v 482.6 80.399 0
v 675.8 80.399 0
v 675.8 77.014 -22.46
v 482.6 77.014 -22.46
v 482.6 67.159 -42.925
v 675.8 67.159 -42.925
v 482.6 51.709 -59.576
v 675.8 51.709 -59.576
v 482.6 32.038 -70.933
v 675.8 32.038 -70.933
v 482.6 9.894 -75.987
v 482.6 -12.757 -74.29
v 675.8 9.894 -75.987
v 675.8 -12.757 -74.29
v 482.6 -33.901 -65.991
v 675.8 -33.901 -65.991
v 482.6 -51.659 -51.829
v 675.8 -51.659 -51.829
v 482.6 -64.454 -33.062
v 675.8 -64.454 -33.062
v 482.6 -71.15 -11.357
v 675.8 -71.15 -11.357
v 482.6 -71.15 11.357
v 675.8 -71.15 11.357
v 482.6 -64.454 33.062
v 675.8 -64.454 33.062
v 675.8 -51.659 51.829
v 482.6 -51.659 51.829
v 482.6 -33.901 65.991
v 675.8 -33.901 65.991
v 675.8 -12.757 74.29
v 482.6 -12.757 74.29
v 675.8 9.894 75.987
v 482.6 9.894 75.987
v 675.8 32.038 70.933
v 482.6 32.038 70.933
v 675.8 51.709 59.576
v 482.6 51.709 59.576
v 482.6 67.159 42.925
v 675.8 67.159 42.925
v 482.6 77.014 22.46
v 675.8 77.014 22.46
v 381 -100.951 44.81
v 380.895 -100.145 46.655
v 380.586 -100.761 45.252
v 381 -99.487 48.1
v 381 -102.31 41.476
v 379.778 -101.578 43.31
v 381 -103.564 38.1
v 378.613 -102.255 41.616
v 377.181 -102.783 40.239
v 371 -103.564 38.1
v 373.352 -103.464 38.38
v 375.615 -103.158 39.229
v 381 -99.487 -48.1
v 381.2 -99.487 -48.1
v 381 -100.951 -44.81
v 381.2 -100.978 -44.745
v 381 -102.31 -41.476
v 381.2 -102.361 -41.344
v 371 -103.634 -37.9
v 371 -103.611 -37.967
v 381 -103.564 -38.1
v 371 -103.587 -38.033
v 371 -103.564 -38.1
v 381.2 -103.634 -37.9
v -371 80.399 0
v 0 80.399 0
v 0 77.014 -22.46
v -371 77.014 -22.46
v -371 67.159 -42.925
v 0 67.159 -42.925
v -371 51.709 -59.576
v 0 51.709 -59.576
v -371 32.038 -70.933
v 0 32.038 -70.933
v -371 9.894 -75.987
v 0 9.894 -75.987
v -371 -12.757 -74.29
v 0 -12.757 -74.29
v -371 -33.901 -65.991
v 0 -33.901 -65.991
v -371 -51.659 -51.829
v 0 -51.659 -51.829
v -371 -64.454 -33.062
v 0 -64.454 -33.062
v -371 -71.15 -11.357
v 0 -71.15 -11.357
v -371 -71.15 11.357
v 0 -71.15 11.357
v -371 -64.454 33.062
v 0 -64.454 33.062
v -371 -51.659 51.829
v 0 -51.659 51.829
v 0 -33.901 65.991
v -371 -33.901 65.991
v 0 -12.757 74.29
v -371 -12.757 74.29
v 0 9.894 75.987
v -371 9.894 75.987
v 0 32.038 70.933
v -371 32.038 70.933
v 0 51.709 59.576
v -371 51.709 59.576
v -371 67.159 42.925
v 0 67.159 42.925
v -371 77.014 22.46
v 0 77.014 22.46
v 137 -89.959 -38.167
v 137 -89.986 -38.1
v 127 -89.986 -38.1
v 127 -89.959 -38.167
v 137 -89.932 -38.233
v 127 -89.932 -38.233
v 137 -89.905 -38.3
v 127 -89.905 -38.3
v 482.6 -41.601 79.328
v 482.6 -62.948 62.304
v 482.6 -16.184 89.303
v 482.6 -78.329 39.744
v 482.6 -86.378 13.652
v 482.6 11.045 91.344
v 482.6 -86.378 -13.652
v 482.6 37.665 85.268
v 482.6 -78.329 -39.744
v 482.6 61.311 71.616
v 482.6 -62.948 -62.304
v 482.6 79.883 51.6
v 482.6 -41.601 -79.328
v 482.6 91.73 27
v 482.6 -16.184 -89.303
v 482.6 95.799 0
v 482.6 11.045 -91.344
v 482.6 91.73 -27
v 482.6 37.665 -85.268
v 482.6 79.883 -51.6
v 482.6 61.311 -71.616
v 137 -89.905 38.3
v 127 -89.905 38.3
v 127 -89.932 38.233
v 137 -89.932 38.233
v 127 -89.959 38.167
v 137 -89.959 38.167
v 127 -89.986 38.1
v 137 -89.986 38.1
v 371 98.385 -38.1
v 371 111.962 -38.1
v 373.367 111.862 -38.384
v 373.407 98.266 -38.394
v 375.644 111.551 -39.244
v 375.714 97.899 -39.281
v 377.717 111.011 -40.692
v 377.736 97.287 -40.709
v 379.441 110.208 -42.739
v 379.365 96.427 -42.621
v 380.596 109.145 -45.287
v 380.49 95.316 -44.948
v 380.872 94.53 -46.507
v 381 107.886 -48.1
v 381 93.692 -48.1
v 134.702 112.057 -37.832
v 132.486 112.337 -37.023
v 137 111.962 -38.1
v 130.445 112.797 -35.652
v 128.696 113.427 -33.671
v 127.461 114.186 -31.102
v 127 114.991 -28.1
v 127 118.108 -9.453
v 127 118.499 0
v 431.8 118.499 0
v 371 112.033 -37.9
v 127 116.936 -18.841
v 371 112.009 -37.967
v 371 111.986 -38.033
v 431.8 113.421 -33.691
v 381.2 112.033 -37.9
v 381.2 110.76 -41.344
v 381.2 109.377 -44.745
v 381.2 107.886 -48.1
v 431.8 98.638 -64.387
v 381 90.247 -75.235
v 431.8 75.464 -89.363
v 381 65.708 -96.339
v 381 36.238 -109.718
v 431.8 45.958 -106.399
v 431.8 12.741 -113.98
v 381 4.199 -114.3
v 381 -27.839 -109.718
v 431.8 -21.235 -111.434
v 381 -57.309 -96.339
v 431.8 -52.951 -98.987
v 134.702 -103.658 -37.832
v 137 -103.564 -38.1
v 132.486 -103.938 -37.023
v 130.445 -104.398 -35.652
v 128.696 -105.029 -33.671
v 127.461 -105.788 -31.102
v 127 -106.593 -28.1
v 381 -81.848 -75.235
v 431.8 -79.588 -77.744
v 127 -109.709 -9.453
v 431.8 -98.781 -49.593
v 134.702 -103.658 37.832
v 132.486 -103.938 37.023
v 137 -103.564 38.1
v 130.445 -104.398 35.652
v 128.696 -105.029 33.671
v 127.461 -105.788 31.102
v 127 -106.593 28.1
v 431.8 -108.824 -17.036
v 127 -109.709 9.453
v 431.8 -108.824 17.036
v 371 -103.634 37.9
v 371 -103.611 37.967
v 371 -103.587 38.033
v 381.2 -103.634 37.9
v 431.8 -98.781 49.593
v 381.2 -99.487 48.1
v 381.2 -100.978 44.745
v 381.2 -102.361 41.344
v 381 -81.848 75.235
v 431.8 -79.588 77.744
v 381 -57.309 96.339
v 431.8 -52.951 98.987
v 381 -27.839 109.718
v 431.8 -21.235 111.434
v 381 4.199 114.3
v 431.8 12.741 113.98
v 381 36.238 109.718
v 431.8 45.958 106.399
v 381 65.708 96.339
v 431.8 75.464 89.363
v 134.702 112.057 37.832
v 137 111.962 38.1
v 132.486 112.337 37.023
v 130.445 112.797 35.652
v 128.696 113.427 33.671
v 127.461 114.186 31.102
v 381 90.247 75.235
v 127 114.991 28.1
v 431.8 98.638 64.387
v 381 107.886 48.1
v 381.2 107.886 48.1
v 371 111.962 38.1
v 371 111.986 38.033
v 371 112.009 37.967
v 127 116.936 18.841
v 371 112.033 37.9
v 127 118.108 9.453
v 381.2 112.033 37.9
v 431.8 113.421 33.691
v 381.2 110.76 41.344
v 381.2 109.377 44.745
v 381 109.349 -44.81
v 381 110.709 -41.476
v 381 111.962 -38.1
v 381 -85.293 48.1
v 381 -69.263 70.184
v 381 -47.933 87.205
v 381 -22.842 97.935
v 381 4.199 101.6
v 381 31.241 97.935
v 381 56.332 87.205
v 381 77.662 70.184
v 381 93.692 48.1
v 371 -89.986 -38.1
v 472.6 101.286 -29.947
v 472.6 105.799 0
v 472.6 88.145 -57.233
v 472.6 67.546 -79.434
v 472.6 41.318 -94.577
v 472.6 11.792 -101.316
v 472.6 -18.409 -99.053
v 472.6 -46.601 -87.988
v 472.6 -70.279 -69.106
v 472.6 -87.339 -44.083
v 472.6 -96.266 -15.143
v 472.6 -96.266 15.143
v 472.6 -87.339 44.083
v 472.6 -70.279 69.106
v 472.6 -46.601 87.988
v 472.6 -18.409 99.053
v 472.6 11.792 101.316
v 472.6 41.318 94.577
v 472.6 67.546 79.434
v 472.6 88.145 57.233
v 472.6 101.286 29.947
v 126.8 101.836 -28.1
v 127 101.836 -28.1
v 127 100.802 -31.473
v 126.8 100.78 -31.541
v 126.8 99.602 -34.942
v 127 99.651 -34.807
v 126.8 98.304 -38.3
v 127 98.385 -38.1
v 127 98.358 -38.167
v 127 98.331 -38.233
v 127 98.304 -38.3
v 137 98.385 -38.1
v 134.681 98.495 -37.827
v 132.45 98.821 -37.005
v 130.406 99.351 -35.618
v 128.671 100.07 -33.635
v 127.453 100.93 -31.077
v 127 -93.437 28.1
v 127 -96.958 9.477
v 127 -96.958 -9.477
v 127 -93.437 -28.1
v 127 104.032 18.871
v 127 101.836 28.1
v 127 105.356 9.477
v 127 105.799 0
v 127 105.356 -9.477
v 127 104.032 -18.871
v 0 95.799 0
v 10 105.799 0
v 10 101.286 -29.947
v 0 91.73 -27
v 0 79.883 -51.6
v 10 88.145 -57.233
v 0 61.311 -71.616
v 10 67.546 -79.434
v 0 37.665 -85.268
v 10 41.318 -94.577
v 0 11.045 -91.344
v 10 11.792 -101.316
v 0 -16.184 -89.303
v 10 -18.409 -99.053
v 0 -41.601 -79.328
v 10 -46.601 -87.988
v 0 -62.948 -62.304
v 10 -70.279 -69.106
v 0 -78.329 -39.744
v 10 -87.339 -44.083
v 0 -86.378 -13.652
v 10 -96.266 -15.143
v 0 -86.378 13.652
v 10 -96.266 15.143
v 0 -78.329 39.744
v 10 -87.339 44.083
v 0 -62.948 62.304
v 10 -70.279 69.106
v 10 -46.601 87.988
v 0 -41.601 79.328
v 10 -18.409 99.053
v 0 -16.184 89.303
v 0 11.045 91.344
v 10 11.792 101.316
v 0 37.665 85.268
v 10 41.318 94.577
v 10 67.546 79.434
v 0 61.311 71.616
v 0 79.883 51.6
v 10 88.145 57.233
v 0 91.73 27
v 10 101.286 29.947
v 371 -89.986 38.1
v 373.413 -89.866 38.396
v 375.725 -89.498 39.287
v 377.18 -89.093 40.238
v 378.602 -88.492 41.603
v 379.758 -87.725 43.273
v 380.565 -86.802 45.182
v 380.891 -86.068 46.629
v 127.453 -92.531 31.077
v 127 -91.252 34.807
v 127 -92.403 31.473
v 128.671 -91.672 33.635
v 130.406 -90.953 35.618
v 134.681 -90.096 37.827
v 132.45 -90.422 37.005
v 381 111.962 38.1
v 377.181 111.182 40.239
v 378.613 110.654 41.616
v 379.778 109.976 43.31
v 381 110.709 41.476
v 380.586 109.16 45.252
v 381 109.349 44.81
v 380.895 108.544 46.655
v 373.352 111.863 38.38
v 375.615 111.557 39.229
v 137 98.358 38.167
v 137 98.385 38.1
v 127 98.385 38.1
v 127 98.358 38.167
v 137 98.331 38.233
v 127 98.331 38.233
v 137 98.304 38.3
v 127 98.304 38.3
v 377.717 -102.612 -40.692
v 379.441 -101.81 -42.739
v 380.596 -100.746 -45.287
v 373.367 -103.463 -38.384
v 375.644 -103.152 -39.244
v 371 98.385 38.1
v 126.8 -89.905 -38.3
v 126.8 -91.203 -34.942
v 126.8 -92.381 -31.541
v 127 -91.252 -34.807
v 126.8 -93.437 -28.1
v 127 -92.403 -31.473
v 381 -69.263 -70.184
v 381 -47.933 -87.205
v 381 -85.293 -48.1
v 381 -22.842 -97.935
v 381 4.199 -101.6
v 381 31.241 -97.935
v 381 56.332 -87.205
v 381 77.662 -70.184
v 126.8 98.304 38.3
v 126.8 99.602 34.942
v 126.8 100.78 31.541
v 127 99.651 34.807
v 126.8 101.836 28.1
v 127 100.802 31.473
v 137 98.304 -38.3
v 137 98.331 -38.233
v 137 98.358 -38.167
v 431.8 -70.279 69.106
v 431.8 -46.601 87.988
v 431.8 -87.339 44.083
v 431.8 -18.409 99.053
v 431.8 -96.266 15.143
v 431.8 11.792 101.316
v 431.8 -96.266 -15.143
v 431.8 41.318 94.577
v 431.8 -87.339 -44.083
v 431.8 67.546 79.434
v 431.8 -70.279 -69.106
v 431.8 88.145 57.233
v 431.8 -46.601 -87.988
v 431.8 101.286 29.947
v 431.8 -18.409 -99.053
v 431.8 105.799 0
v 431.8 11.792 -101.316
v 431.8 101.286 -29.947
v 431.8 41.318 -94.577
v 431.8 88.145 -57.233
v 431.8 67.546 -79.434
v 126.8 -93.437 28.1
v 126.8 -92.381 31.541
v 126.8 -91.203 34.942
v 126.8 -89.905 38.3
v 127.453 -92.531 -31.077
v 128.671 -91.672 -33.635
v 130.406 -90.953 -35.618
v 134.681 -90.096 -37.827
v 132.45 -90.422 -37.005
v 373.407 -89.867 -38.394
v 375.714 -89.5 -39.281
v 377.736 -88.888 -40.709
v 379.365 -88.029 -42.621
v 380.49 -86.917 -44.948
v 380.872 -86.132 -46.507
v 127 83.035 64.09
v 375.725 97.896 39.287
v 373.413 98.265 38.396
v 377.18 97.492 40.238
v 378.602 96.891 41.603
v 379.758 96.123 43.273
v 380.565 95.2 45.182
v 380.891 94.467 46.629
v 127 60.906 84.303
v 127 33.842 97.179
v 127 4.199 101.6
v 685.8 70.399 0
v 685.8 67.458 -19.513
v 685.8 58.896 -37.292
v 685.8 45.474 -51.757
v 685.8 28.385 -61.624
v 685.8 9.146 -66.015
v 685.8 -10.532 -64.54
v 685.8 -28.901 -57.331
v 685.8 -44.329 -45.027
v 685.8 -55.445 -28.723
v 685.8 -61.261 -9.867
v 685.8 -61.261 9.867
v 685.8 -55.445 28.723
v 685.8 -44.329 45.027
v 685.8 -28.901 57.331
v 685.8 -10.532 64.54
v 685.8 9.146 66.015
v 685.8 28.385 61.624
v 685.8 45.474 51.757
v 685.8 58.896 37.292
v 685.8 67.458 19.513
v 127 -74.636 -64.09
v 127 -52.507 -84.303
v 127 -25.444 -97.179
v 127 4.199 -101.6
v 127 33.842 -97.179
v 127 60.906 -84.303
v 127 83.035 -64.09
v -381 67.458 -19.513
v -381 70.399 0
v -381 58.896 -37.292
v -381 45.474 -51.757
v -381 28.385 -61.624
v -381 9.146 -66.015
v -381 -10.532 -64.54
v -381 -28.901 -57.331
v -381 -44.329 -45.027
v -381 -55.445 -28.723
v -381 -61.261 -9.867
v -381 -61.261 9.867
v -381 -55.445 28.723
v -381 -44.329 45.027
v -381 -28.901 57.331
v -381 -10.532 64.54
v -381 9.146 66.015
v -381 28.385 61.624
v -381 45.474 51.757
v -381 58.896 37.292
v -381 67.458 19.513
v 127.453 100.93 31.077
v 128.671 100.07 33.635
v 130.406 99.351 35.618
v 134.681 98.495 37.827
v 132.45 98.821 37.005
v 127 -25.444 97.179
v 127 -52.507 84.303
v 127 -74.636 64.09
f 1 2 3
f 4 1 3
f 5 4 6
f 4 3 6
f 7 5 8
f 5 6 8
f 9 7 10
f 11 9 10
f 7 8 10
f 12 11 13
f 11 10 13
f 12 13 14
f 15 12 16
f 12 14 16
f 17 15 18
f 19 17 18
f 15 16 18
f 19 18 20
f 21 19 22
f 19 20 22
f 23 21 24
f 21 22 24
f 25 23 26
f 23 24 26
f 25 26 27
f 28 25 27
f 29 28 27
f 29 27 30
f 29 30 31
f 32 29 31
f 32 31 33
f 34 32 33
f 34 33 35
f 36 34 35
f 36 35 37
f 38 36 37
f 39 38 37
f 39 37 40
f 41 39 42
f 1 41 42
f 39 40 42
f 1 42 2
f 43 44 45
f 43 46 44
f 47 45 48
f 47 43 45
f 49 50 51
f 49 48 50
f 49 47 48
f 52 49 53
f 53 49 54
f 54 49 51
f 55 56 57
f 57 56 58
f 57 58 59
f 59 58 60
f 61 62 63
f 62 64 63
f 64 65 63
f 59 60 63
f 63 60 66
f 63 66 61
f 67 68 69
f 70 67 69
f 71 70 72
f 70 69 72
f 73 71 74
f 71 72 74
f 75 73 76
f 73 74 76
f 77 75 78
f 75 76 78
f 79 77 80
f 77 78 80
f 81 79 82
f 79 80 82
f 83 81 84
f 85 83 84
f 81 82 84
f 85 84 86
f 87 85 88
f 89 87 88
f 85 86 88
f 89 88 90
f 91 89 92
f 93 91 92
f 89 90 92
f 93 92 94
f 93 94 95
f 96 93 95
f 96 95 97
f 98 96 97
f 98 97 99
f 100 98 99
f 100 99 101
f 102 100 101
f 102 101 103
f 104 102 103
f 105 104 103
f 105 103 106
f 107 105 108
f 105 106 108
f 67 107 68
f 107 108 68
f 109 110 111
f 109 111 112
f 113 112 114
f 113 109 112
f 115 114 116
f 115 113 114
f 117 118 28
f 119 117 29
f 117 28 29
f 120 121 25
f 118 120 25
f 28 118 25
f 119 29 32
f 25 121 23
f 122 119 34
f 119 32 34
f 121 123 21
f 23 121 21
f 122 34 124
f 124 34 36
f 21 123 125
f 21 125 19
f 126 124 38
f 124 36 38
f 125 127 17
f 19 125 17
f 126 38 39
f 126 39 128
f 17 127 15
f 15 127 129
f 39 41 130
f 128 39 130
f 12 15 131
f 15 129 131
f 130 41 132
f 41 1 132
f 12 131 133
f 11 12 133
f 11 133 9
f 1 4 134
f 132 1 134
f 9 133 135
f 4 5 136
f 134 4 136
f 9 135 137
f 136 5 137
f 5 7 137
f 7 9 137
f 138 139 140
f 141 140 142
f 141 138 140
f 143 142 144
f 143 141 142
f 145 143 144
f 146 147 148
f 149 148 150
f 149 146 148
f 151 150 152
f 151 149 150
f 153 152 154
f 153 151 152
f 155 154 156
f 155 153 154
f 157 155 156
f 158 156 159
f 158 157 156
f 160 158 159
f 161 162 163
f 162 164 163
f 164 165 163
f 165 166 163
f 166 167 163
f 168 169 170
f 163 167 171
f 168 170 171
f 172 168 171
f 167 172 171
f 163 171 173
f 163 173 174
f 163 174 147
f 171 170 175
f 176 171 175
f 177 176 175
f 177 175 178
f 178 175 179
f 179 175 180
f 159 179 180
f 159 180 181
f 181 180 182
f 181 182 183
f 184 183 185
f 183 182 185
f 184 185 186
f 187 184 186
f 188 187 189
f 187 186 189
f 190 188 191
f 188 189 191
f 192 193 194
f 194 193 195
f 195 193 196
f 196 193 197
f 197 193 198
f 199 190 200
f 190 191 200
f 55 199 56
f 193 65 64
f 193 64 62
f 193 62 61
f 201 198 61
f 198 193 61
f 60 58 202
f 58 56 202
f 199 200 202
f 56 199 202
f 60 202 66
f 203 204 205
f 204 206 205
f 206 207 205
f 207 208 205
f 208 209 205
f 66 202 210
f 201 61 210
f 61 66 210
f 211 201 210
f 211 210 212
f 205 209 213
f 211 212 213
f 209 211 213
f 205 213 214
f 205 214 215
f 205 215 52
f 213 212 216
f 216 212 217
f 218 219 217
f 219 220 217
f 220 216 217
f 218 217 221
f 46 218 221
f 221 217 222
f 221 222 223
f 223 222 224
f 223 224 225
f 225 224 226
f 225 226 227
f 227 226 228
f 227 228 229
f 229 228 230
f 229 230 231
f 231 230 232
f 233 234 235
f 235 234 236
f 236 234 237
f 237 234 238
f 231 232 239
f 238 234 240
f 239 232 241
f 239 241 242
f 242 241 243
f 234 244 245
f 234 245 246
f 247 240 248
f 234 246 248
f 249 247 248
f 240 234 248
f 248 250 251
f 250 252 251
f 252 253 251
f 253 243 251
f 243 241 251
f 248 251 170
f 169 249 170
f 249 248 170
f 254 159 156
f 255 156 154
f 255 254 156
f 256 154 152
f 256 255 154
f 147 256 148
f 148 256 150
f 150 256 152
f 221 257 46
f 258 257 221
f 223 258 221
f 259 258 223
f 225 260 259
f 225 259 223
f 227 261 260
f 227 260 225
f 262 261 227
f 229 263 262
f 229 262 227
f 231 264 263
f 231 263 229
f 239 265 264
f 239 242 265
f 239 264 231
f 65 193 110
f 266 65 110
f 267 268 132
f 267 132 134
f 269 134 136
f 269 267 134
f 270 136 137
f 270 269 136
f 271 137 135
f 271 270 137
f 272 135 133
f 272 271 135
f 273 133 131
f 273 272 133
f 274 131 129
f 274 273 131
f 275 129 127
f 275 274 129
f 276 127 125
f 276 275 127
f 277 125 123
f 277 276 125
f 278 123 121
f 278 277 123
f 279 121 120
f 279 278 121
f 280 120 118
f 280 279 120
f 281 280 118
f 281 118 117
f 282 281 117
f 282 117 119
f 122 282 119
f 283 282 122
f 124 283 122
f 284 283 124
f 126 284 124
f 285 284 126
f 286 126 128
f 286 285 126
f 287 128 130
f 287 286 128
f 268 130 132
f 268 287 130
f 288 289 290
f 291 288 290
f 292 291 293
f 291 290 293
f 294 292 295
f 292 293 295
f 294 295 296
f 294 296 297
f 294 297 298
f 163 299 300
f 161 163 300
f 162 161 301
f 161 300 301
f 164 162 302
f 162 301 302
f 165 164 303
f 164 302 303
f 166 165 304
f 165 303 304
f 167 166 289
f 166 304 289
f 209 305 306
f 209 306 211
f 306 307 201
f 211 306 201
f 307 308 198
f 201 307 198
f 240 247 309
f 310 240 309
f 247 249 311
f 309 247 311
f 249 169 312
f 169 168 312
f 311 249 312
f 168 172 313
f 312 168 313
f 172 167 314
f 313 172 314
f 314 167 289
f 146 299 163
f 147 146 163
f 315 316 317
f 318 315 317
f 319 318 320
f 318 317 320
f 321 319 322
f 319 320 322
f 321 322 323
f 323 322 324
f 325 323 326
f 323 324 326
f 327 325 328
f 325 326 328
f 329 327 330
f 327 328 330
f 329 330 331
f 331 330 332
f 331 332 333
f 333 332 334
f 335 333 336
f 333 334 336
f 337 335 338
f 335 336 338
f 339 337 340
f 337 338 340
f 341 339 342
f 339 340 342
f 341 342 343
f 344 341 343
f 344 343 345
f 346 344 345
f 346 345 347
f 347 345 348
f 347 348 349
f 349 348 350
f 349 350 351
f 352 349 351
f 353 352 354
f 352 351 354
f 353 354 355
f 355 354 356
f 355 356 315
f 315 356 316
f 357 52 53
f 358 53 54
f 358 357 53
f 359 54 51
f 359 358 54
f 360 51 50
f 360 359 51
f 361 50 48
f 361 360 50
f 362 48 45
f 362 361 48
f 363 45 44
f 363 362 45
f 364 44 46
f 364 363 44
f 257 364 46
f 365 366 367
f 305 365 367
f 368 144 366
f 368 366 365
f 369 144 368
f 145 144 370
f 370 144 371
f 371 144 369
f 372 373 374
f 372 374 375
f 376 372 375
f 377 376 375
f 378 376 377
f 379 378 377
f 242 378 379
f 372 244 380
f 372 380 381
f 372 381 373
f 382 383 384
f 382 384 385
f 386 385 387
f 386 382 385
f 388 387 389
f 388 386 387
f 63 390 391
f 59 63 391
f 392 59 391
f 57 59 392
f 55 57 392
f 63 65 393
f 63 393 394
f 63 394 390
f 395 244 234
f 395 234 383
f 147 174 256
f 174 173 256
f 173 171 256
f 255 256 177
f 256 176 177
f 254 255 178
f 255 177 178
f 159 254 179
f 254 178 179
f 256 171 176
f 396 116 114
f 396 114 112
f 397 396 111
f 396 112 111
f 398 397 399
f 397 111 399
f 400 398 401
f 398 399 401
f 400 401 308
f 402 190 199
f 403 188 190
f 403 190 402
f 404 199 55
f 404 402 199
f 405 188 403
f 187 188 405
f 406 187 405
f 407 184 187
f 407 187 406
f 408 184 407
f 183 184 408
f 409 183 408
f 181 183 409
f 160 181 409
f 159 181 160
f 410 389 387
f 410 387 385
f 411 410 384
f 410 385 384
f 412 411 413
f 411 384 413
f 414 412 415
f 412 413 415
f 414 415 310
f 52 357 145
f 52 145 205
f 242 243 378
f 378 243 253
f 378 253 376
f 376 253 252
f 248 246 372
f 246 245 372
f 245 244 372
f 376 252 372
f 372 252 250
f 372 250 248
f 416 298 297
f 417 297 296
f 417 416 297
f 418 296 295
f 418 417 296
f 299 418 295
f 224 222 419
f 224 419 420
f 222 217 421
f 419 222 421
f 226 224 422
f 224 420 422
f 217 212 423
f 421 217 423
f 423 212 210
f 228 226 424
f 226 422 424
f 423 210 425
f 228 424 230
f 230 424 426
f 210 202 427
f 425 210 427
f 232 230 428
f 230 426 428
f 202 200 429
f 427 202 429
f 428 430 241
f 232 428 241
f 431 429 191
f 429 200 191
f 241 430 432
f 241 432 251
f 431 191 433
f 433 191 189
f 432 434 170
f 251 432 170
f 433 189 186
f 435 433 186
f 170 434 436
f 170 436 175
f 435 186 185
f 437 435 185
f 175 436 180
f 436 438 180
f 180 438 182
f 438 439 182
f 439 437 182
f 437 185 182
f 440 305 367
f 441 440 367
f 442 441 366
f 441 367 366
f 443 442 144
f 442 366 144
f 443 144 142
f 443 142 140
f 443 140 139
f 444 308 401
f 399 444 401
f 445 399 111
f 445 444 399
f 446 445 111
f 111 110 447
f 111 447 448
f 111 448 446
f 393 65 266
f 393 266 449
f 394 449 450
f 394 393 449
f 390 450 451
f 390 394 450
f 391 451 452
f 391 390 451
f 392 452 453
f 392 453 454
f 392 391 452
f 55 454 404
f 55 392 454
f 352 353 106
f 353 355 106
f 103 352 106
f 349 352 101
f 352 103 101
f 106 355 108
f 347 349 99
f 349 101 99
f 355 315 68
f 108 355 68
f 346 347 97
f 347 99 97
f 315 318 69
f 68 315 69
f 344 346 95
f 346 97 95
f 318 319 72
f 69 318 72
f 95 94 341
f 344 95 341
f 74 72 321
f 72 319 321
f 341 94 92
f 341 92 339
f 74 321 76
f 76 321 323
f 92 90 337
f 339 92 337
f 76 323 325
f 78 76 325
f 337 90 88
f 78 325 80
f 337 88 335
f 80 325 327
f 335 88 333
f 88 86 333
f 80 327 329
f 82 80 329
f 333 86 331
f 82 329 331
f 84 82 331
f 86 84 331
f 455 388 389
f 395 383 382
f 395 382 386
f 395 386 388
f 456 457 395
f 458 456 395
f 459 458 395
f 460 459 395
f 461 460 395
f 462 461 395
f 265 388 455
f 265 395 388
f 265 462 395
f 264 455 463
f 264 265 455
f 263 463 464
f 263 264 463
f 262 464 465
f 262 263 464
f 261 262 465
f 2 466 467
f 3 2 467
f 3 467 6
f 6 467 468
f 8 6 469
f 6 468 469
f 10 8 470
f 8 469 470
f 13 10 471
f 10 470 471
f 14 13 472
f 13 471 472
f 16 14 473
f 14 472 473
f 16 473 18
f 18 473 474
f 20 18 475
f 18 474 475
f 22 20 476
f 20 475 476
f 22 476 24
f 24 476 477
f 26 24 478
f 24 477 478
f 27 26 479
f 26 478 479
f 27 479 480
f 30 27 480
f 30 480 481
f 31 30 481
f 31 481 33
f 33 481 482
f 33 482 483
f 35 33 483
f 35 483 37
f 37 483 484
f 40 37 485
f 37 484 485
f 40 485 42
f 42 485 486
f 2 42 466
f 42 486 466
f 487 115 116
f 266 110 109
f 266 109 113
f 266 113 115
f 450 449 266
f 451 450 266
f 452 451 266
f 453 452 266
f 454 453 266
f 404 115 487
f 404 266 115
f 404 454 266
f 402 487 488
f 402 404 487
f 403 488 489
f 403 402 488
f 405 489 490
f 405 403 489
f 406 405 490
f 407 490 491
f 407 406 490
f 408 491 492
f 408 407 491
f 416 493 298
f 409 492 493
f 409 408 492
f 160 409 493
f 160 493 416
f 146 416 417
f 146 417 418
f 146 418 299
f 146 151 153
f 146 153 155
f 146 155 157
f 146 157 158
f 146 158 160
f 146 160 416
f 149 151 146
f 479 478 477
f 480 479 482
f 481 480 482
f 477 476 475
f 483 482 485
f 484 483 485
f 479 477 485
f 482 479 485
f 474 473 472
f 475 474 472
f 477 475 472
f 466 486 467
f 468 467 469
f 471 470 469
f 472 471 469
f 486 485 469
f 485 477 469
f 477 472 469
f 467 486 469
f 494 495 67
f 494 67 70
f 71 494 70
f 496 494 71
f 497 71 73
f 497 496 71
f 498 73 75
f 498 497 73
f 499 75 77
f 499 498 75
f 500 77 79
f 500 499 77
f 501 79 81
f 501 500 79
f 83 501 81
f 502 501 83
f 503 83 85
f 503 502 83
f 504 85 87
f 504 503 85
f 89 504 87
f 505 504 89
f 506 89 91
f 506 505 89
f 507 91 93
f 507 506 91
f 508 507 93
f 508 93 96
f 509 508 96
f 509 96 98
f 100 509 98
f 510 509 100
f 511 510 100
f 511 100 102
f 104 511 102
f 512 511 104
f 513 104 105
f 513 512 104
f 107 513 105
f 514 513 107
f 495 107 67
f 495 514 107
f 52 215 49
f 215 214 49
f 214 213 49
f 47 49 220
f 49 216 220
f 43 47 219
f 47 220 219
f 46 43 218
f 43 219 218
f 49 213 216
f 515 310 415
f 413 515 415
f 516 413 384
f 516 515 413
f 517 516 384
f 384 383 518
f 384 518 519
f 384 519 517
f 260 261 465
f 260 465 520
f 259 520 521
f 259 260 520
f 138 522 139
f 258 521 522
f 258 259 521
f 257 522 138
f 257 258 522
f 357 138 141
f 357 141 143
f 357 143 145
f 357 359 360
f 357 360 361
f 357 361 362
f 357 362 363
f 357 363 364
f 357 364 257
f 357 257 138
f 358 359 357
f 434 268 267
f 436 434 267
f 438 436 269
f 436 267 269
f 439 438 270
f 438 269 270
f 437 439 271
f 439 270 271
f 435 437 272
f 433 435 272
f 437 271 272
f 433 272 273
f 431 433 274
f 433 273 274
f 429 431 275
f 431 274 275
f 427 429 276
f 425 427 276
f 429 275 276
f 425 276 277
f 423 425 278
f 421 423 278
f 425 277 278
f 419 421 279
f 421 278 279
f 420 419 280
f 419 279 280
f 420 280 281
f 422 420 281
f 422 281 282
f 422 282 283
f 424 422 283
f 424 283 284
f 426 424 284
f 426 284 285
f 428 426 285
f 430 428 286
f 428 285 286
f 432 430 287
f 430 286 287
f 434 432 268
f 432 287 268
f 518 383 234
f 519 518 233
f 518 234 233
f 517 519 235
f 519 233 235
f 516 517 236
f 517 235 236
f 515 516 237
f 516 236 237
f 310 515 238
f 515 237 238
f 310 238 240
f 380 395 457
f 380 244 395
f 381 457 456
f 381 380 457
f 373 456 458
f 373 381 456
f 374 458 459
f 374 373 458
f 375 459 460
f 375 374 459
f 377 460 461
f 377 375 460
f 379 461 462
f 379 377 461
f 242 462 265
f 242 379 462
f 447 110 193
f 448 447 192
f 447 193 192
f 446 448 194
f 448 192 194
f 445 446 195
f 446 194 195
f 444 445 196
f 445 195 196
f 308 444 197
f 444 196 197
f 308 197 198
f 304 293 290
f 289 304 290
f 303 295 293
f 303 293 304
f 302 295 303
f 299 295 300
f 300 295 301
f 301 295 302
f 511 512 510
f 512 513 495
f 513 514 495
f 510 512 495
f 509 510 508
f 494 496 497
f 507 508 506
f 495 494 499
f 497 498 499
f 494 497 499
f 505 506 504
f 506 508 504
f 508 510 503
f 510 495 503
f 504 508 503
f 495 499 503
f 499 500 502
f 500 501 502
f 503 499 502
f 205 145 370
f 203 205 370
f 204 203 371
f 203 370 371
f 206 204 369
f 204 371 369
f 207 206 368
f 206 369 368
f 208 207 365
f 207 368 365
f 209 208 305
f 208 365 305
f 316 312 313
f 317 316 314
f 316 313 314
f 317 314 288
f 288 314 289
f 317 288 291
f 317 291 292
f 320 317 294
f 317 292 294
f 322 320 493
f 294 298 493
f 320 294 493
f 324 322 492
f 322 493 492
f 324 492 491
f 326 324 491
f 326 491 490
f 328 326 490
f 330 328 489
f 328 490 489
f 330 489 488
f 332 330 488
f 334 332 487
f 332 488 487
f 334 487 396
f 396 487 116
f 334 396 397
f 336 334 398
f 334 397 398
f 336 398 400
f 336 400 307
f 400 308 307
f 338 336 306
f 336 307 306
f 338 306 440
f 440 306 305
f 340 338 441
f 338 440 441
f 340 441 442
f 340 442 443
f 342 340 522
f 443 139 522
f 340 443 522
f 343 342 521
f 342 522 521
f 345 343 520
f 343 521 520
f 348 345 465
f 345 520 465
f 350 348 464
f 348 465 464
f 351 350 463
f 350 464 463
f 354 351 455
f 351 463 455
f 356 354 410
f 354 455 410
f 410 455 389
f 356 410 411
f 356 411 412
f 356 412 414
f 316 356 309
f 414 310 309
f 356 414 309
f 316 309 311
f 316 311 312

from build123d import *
from build123d.topology import SkipClean

# Parameters (mm, degrees)
CUT_EXTRUDE1_START = -254
CUT_EXTRUDE1_DEPTH = 254
CHAMFER1_SIZE      = 10
CHAMFER2_SIZE      = 10
CHAMFER3_SIZE      = 10
CHAMFER4_SIZE      = 10
FILLET1_R          = 10


with BuildPart() as part:
    # Sketch1 → Revolve4 (revolve)
    with BuildSketch(Plane.XY):
        Polygon((-381, 4.199357945), (-381, 80.399357945), (0, 80.399357945), (0, 105.799357945), (127, 105.799357945), (127, 118.499357945), (431.8, 118.499357945), (431.8, 105.799357945), (482.6, 105.799357945), (482.6, 80.399357945), (685.8, 80.399357945), (685.8, 4.199357945), align=None)
    revolve(axis=Axis((685.8, 4.199357945, 0), (-1, 0, 0)))

    # Sketch3 → Cut-Extrude1 (cut)
    with SkipClean():  # the faces are left unmerged after this step: merging them gives an invalid solid
        with BuildSketch(Plane.ZY.offset(-127).offset(CUT_EXTRUDE1_START)):
            with BuildLine():
                Line((38.1, -89.986362841), (38.1, -103.563715507))
                ThreePointArc((38.1, -103.563715507), (93.3255592, -61.791777823), (114.3, 4.199357945))
                ThreePointArc((114.3, 4.199357945), (93.3255592, 70.190493714), (38.1, 111.962431398))
                Line((38.1, 111.962431398), (38.1, 98.385078732))
                ThreePointArc((38.1, 98.385078732), (84.242269675, 60.995484574), (101.6, 4.199357945))
                ThreePointArc((101.6, 4.199357945), (84.242269675, -52.596768683), (38.1, -89.986362841))
            make_face()
            with BuildLine():
                ThreePointArc((-38.1, 111.962431398), (-114.3, 4.199357945), (-38.1, -103.563715507))
                Line((-38.1, -103.563715507), (-38.1, -89.986362841))
                ThreePointArc((-38.1, -89.986362841), (-101.6, 4.199357945), (-38.1, 98.385078732))
                Line((-38.1, 98.385078732), (-38.1, 111.962431398))
            make_face()
        extrude(amount=CUT_EXTRUDE1_DEPTH, mode=Mode.SUBTRACT)

    # Chamfer1
    chamfer1_edges = [part.edges().sort_by_distance(p)[0] for p in [
        (685.8, -72.000642055, 0),
    ]]
    chamfer(chamfer1_edges, length=CHAMFER1_SIZE)

    # Chamfer2
    chamfer2_edges = [part.edges().sort_by_distance(p)[0] for p in [
        (482.6, -97.400642055, 0),
    ]]
    chamfer(chamfer2_edges, length=CHAMFER2_SIZE)

    # Chamfer3
    chamfer3_edges = [part.edges().sort_by_distance(p)[0] for p in [
        (-381, -72.000642055, 0),
    ]]
    chamfer(chamfer3_edges, length=CHAMFER3_SIZE)

    # Chamfer4
    chamfer4_edges = [part.edges().sort_by_distance(p)[0] for p in [
        (0, -97.400642055, 0),
    ]]
    chamfer(chamfer4_edges, length=CHAMFER4_SIZE)

    # Fillet1
    # the kernel refuses this fillet: 10 mm, written as the material it adds along each edge
    with BuildSketch(Plane(origin=(381, -64.986362841, 38.1), x_dir=(-1, 0, 0), z_dir=(0, -1, 0))) as fillet1_piece_1_section:
        with BuildLine():
            CenterArc((FILLET1_R, -FILLET1_R), FILLET1_R, 90, 90)
            Line((0, -FILLET1_R), (-FILLET1_R * 0.02, -FILLET1_R))
            Line((-FILLET1_R * 0.02, -FILLET1_R), (-FILLET1_R * 0.02, FILLET1_R * 0.02))
            Line((-FILLET1_R * 0.02, FILLET1_R * 0.02), (FILLET1_R, FILLET1_R * 0.02))
            Line((FILLET1_R, FILLET1_R * 0.02), (FILLET1_R, 0))
        make_face()
    fillet1_piece_1 = extrude(amount=63.577352667, mode=Mode.PRIVATE)
    fillet1_piece_1 = fillet1_piece_1 - Plane(origin=(378.747471164, 4.199357945, 0), x_dir=(0, 0.9270248108869475, 0.3750000000000256), z_dir=(1, 0, 0)) * Cylinder(101.6, 168, mode=Mode.PRIVATE)
    fillet1_piece_1 = fillet1_piece_1 & Plane(origin=(378.747471164, 4.199357945, 0), x_dir=(0, 1, 0), z_dir=(1, 0, 0)) * Cylinder(114.3, 168, mode=Mode.PRIVATE)
    add(fillet1_piece_1)
    with BuildSketch(Plane(origin=(381, 136.962431398, 38.1), x_dir=(-1, 0, 0), z_dir=(0, -1, 0))) as fillet1_piece_2_section:
        with BuildLine():
            CenterArc((FILLET1_R, -FILLET1_R), FILLET1_R, 90, 90)
            Line((0, -FILLET1_R), (-FILLET1_R * 0.02, -FILLET1_R))
            Line((-FILLET1_R * 0.02, -FILLET1_R), (-FILLET1_R * 0.02, FILLET1_R * 0.02))
            Line((-FILLET1_R * 0.02, FILLET1_R * 0.02), (FILLET1_R, FILLET1_R * 0.02))
            Line((FILLET1_R, FILLET1_R * 0.02), (FILLET1_R, 0))
        make_face()
    fillet1_piece_2 = extrude(amount=63.577352667, mode=Mode.PRIVATE)
    fillet1_piece_2 = fillet1_piece_2 - Plane(origin=(378.747465839, 4.199357945, 0), x_dir=(0, 0.9270248108869475, 0.3750000000000256), z_dir=(1, 0, 0)) * Cylinder(101.6, 168, mode=Mode.PRIVATE)
    fillet1_piece_2 = fillet1_piece_2 & Plane(origin=(378.747465839, 4.199357945, 0), x_dir=(0, 1, 0), z_dir=(1, 0, 0)) * Cylinder(114.3, 168, mode=Mode.PRIVATE)
    add(fillet1_piece_2)
    with BuildSketch(Plane(origin=(381, 73.385078732, -38.1), x_dir=(-1, 0, 0), z_dir=(0, 1, 0))) as fillet1_piece_3_section:
        with BuildLine():
            CenterArc((FILLET1_R, -FILLET1_R), FILLET1_R, 90, 90)
            Line((0, -FILLET1_R), (-FILLET1_R * 0.02, -FILLET1_R))
            Line((-FILLET1_R * 0.02, -FILLET1_R), (-FILLET1_R * 0.02, FILLET1_R * 0.02))
            Line((-FILLET1_R * 0.02, FILLET1_R * 0.02), (FILLET1_R, FILLET1_R * 0.02))
            Line((FILLET1_R, FILLET1_R * 0.02), (FILLET1_R, 0))
        make_face()
    fillet1_piece_3 = extrude(amount=63.577352667, mode=Mode.PRIVATE)
    fillet1_piece_3 = fillet1_piece_3 - Plane(origin=(378.747465659, 4.199357945, 0), x_dir=(0, -0.9270248108869582, -0.3749999999999992), z_dir=(1, 0, 0)) * Cylinder(101.6, 168, mode=Mode.PRIVATE)
    fillet1_piece_3 = fillet1_piece_3 & Plane(origin=(378.747465659, 4.199357945, 0), x_dir=(0, 1, 0), z_dir=(1, 0, 0)) * Cylinder(114.3, 168, mode=Mode.PRIVATE)
    add(fillet1_piece_3)
    with BuildSketch(Plane(origin=(381, -128.563715507, -38.1), x_dir=(-1, 0, 0), z_dir=(0, 1, 0))) as fillet1_piece_4_section:
        with BuildLine():
            CenterArc((FILLET1_R, -FILLET1_R), FILLET1_R, 90, 90)
            Line((0, -FILLET1_R), (-FILLET1_R * 0.02, -FILLET1_R))
            Line((-FILLET1_R * 0.02, -FILLET1_R), (-FILLET1_R * 0.02, FILLET1_R * 0.02))
            Line((-FILLET1_R * 0.02, FILLET1_R * 0.02), (FILLET1_R, FILLET1_R * 0.02))
            Line((FILLET1_R, FILLET1_R * 0.02), (FILLET1_R, 0))
        make_face()
    fillet1_piece_4 = extrude(amount=63.577352667, mode=Mode.PRIVATE)
    fillet1_piece_4 = fillet1_piece_4 - Plane(origin=(378.747464841, 4.199357945, 0), x_dir=(0, -0.9270248108869582, -0.3749999999999992), z_dir=(1, 0, 0)) * Cylinder(101.6, 168, mode=Mode.PRIVATE)
    fillet1_piece_4 = fillet1_piece_4 & Plane(origin=(378.747464841, 4.199357945, 0), x_dir=(0, 1, 0), z_dir=(1, 0, 0)) * Cylinder(114.3, 168, mode=Mode.PRIVATE)
    add(fillet1_piece_4)
    # the kernel refuses this fillet: 10 mm, written as the material it takes off along each edge
    with BuildSketch(Plane(origin=(127, -64.986362841, 38.1), x_dir=(0, 0, -1), z_dir=(0, -1, 0))) as fillet1_2_piece_1_section:
        with BuildLine():
            CenterArc((FILLET1_R, FILLET1_R), FILLET1_R, 180, 90)
            Line((0, FILLET1_R), (-FILLET1_R * 0.02, FILLET1_R))
            Line((-FILLET1_R * 0.02, FILLET1_R), (-FILLET1_R * 0.02, -FILLET1_R * 0.02))
            Line((-FILLET1_R * 0.02, -FILLET1_R * 0.02), (FILLET1_R, -FILLET1_R * 0.02))
            Line((FILLET1_R, -FILLET1_R * 0.02), (FILLET1_R, 0))
        make_face()
    fillet1_2_piece_1 = extrude(amount=63.577352667, mode=Mode.PRIVATE)
    fillet1_2_piece_1 = fillet1_2_piece_1 - Plane(origin=(129.273265728, 4.199357945, 0), x_dir=(0, 1, 0), z_dir=(1, 0, 0)) * Cylinder(101.6, 168, mode=Mode.PRIVATE)
    fillet1_2_piece_1 = fillet1_2_piece_1 & Plane(origin=(129.273265728, 4.199357945, 0), x_dir=(0, 1, 0), z_dir=(1, 0, 0)) * Cylinder(114.3, 168, mode=Mode.PRIVATE)
    add(fillet1_2_piece_1, mode=Mode.SUBTRACT)
    with BuildSketch(Plane(origin=(127, 136.962431398, 38.1), x_dir=(0, 0, -1), z_dir=(0, -1, 0))) as fillet1_2_piece_2_section:
        with BuildLine():
            CenterArc((FILLET1_R, FILLET1_R), FILLET1_R, 180, 90)
            Line((0, FILLET1_R), (-FILLET1_R * 0.02, FILLET1_R))
            Line((-FILLET1_R * 0.02, FILLET1_R), (-FILLET1_R * 0.02, -FILLET1_R * 0.02))
            Line((-FILLET1_R * 0.02, -FILLET1_R * 0.02), (FILLET1_R, -FILLET1_R * 0.02))
            Line((FILLET1_R, -FILLET1_R * 0.02), (FILLET1_R, 0))
        make_face()
    fillet1_2_piece_2 = extrude(amount=63.577352667, mode=Mode.PRIVATE)
    fillet1_2_piece_2 = fillet1_2_piece_2 - Plane(origin=(129.273255891, 4.199357945, 0), x_dir=(0, 1, 0), z_dir=(1, 0, 0)) * Cylinder(101.6, 168, mode=Mode.PRIVATE)
    fillet1_2_piece_2 = fillet1_2_piece_2 & Plane(origin=(129.273255891, 4.199357945, 0), x_dir=(0, 1, 0), z_dir=(1, 0, 0)) * Cylinder(114.3, 168, mode=Mode.PRIVATE)
    add(fillet1_2_piece_2, mode=Mode.SUBTRACT)
    with BuildSketch(Plane(origin=(127, -128.563715507, -38.1), x_dir=(0, 0, 1), z_dir=(0, 1, 0))) as fillet1_2_piece_3_section:
        with BuildLine():
            CenterArc((FILLET1_R, FILLET1_R), FILLET1_R, 180, 90)
            Line((0, FILLET1_R), (-FILLET1_R * 0.02, FILLET1_R))
            Line((-FILLET1_R * 0.02, FILLET1_R), (-FILLET1_R * 0.02, -FILLET1_R * 0.02))
            Line((-FILLET1_R * 0.02, -FILLET1_R * 0.02), (FILLET1_R, -FILLET1_R * 0.02))
            Line((FILLET1_R, -FILLET1_R * 0.02), (FILLET1_R, 0))
        make_face()
    fillet1_2_piece_3 = extrude(amount=63.577352667, mode=Mode.PRIVATE)
    fillet1_2_piece_3 = fillet1_2_piece_3 - Plane(origin=(129.273255891, 4.199357945, 0), x_dir=(0, 1, 0), z_dir=(1, 0, 0)) * Cylinder(101.6, 168, mode=Mode.PRIVATE)
    fillet1_2_piece_3 = fillet1_2_piece_3 & Plane(origin=(129.273255891, 4.199357945, 0), x_dir=(0, 1, 0), z_dir=(1, 0, 0)) * Cylinder(114.3, 168, mode=Mode.PRIVATE)
    add(fillet1_2_piece_3, mode=Mode.SUBTRACT)
    with BuildSketch(Plane(origin=(127, 73.385078732, -38.1), x_dir=(0, 0, 1), z_dir=(0, 1, 0))) as fillet1_2_piece_4_section:
        with BuildLine():
            CenterArc((FILLET1_R, FILLET1_R), FILLET1_R, 180, 90)
            Line((0, FILLET1_R), (-FILLET1_R * 0.02, FILLET1_R))
            Line((-FILLET1_R * 0.02, FILLET1_R), (-FILLET1_R * 0.02, -FILLET1_R * 0.02))
            Line((-FILLET1_R * 0.02, -FILLET1_R * 0.02), (FILLET1_R, -FILLET1_R * 0.02))
            Line((FILLET1_R, -FILLET1_R * 0.02), (FILLET1_R, 0))
        make_face()
    fillet1_2_piece_4 = extrude(amount=63.577352667, mode=Mode.PRIVATE)
    fillet1_2_piece_4 = fillet1_2_piece_4 - Plane(origin=(129.273265728, 4.199357945, 0), x_dir=(0, 1, 0), z_dir=(1, 0, 0)) * Cylinder(101.6, 168, mode=Mode.PRIVATE)
    fillet1_2_piece_4 = fillet1_2_piece_4 & Plane(origin=(129.273265728, 4.199357945, 0), x_dir=(0, 1, 0), z_dir=(1, 0, 0)) * Cylinder(114.3, 168, mode=Mode.PRIVATE)
    add(fillet1_2_piece_4, mode=Mode.SUBTRACT)


solid = part.part
